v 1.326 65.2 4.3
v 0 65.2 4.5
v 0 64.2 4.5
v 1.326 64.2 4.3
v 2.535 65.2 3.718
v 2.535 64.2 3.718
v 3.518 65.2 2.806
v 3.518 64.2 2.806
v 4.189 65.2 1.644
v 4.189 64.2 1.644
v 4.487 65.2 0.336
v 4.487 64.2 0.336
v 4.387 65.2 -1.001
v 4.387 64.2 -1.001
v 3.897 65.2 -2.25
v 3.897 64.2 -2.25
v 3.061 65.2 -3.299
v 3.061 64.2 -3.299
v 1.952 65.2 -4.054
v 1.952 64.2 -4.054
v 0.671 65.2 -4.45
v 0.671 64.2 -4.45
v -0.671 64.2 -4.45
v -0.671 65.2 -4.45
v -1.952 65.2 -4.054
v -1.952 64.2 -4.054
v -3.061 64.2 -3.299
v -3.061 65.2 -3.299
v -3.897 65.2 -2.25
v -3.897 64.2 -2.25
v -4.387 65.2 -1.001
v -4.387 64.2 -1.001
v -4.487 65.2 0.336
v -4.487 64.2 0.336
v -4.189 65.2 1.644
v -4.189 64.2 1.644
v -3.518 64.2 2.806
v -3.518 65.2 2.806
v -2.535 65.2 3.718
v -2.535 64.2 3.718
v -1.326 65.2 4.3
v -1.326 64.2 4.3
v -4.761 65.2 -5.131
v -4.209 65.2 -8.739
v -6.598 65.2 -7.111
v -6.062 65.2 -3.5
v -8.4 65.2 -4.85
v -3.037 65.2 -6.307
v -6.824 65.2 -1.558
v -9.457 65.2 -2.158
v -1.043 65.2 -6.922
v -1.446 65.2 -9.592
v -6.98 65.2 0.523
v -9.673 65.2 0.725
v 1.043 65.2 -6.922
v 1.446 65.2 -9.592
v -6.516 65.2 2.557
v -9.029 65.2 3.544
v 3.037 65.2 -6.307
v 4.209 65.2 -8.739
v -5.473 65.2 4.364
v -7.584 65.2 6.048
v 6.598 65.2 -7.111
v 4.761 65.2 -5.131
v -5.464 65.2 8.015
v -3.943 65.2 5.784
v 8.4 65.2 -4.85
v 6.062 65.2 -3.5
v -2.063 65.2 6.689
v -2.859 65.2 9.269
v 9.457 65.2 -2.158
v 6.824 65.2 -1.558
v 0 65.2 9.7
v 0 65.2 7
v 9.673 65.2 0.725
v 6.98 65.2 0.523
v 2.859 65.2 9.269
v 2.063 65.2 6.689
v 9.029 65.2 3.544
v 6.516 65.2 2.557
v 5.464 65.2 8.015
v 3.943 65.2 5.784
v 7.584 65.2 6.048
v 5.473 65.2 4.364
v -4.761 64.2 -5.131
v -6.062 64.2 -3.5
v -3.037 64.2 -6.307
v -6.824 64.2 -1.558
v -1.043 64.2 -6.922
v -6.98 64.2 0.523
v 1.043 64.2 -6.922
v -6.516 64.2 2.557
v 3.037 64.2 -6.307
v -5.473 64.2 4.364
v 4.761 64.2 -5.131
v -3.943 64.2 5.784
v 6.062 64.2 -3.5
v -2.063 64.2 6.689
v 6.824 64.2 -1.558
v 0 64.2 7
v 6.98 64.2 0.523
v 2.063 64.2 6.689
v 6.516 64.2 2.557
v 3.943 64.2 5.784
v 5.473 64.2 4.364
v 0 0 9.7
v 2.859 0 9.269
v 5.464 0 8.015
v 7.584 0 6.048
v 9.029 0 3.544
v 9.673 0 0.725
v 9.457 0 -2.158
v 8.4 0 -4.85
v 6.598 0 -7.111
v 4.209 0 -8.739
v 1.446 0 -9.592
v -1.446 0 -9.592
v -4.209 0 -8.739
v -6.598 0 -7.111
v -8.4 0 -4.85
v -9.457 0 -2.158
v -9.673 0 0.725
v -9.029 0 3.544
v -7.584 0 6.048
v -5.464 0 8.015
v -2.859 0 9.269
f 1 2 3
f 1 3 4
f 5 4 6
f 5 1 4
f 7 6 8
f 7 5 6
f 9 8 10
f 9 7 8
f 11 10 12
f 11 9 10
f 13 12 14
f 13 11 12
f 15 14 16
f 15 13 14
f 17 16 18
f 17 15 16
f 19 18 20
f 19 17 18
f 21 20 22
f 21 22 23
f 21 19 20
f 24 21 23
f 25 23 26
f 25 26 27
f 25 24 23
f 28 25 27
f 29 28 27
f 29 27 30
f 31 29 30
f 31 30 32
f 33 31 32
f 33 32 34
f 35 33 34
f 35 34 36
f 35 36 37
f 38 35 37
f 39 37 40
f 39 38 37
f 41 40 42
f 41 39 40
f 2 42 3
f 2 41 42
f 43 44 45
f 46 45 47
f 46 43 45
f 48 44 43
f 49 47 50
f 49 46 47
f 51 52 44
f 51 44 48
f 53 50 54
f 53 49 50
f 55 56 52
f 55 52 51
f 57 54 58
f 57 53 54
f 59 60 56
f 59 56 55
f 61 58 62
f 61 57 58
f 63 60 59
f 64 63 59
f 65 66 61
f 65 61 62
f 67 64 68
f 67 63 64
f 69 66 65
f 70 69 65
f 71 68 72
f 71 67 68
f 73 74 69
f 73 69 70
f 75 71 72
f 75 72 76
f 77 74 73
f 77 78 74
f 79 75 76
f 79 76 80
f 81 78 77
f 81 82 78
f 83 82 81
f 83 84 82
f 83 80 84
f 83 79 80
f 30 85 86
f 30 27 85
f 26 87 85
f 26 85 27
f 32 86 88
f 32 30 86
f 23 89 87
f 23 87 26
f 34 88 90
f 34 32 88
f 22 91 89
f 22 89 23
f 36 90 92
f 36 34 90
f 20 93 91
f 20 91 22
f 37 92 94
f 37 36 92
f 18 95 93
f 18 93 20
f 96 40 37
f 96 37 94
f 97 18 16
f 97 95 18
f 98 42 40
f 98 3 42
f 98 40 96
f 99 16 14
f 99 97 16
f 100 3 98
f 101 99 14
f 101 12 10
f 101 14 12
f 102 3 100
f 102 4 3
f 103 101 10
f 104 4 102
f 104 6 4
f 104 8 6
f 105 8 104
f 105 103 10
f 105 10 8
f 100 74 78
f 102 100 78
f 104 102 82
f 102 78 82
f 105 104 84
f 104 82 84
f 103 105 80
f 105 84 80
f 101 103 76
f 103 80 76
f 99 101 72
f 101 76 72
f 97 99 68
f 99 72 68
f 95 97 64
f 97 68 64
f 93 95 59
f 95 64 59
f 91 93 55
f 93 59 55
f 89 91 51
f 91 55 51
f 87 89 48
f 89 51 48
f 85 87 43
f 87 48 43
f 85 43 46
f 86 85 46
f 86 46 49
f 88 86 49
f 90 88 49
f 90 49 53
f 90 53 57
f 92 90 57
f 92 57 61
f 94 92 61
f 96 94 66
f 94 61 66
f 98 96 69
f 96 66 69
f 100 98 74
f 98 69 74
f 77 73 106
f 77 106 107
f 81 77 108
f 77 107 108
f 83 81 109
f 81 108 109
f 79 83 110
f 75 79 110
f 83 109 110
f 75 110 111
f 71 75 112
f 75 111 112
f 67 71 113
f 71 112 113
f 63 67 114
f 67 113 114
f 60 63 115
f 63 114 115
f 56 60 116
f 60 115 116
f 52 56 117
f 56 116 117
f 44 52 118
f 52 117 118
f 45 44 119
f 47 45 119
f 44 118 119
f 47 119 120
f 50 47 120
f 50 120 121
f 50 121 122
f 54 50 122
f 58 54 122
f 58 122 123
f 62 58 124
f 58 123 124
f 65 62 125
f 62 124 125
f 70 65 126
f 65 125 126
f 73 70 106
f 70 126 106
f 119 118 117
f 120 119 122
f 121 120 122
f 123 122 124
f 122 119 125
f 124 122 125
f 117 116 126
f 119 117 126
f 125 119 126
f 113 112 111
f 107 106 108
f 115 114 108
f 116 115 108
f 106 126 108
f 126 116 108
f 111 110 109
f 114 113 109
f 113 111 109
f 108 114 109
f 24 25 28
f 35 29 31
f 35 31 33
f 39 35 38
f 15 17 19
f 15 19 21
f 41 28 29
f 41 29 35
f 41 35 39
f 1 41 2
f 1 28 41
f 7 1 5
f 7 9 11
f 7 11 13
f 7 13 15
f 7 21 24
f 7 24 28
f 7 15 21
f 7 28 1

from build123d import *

# Parameters (mm, degrees)
SKETCH2_R           = 9.7
BOSS_EXTRUDE1_DEPTH = 65.2
SKETCH3_R           = 7
SKETCH3_R_2         = 4.5
CUT_EXTRUDE1_DEPTH  = 1


with BuildPart() as part:
    # Sketch2 → Boss-Extrude1 (new body)
    with BuildSketch(Plane(origin=(0, 0, 0), x_dir=(1, 0, 0), z_dir=(0, 1, 0))):
        Circle(SKETCH2_R)
    extrude(amount=BOSS_EXTRUDE1_DEPTH)

    # Sketch3 → Cut-Extrude1 (cut)
    with BuildSketch(Plane(origin=(0, 65.2, 0), x_dir=(1, 0, 0), z_dir=(0, 1, 0))):
        Circle(SKETCH3_R)
        Circle(SKETCH3_R_2, mode=Mode.SUBTRACT)
    extrude(amount=-CUT_EXTRUDE1_DEPTH, mode=Mode.SUBTRACT)


solid = part.part
